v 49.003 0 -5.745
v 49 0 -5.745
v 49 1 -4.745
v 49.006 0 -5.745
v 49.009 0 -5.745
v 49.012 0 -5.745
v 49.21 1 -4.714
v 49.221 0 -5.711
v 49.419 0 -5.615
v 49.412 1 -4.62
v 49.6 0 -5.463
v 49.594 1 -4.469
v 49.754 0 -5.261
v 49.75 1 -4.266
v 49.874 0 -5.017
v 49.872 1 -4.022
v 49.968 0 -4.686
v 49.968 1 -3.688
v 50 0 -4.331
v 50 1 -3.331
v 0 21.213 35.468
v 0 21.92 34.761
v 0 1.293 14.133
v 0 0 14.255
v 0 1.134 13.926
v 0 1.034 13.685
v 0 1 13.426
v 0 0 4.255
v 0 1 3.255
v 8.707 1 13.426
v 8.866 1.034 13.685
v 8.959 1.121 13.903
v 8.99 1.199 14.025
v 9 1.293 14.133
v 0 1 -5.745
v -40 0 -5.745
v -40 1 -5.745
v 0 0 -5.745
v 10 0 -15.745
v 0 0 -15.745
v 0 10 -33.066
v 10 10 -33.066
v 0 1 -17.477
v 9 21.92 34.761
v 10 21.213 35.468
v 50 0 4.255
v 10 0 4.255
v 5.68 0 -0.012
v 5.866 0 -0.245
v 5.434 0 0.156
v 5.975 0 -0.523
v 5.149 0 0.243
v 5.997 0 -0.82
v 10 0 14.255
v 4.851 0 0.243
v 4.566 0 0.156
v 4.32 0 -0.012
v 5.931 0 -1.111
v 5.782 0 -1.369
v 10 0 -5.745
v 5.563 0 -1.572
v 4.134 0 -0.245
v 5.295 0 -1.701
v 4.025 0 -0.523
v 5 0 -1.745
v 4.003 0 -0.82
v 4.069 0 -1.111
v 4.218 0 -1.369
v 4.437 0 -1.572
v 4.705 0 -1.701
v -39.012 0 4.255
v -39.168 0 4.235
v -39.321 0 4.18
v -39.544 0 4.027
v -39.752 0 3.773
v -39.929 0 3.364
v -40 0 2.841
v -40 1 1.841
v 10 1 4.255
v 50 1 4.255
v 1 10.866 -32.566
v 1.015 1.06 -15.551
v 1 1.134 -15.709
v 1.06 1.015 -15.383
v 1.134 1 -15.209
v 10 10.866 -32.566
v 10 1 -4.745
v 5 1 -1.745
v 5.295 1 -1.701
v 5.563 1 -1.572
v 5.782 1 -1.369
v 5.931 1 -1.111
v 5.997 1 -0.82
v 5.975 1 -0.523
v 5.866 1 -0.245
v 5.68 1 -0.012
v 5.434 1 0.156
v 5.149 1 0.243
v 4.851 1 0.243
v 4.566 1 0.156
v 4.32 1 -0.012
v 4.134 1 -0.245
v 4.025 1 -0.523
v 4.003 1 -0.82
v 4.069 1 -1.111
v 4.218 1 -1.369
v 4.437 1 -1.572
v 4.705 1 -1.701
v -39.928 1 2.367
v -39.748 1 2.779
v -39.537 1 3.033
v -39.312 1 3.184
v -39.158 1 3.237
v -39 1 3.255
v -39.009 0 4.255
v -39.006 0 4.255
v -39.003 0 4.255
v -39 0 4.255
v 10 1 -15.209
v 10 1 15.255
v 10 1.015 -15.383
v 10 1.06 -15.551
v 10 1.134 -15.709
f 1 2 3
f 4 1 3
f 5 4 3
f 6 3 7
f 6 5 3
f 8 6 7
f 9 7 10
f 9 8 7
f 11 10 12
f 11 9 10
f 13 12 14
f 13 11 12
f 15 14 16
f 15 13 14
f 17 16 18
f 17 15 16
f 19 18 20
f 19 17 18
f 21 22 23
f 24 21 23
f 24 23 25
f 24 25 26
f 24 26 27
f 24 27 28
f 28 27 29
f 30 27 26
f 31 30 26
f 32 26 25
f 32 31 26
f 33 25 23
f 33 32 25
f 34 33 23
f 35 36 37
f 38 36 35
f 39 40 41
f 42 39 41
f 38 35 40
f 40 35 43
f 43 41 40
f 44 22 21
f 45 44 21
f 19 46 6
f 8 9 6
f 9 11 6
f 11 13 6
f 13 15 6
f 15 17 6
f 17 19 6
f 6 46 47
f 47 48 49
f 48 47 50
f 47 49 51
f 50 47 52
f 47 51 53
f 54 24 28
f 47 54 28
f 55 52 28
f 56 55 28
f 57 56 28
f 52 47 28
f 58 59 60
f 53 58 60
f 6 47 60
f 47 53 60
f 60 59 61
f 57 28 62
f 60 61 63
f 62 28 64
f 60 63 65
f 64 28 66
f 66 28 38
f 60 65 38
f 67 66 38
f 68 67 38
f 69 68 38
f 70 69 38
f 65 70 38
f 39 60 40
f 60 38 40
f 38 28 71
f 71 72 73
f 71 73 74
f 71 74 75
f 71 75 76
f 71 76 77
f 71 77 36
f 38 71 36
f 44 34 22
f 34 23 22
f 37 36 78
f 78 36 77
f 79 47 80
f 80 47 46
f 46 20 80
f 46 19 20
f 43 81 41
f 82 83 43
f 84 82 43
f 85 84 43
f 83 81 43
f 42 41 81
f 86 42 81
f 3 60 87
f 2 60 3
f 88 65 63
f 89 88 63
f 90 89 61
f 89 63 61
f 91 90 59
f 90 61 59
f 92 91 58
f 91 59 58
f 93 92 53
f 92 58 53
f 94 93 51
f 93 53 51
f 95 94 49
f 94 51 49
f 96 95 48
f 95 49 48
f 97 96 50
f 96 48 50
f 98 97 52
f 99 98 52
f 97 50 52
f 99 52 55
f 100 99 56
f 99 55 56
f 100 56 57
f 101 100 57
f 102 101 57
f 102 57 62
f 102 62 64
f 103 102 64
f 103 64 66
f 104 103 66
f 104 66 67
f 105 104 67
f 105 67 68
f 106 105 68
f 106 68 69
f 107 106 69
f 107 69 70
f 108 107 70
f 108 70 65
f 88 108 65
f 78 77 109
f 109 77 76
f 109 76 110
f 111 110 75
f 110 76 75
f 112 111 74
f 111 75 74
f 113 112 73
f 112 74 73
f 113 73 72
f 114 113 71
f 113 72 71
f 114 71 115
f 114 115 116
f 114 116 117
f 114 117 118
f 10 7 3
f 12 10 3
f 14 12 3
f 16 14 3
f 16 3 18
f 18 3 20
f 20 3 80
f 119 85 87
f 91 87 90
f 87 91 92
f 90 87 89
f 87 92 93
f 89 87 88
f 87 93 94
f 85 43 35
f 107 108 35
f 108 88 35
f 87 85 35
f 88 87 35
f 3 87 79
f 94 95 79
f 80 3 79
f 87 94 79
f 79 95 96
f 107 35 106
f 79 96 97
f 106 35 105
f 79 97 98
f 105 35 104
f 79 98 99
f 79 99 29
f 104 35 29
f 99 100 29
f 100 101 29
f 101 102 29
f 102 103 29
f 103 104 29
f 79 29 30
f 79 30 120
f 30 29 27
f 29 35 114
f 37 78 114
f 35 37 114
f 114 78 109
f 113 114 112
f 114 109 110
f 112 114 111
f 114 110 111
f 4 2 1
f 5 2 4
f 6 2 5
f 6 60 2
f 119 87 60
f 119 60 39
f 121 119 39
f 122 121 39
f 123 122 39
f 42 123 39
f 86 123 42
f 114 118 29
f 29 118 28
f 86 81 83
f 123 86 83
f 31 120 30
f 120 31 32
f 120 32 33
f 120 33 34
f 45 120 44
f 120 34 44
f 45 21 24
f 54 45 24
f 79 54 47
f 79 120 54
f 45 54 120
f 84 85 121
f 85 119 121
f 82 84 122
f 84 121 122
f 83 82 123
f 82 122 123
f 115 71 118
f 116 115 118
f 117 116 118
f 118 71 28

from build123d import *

# Parameters (mm, degrees)
TOP_BLADE_FIRST_EXTRUDE_DEPTH  = 10
SKETCH3_W                      = 40
SKETCH3_H                      = 10
TOP_BLADE_SECOND_EXTRUDE_DEPTH = 1
TOP_BLADE_CUT_1_SIZE           = 1
TOP_BLADE_ROUNDING_1_R         = 1
SKETCH5_R                      = 1
TOP_BLADE_CUT_2_DEPTH          = 19
TOP_BLADE_ROUNDING_2_R         = 1


with BuildPart() as part:
    # Sketch1 → Top Blade First Extrude (new body)
    with BuildSketch(Plane(origin=(0, 0, 0), x_dir=(0, 0, -1), z_dir=(1, 0, 0))):
        Polygon((-14.254658385, 0), (15.745341615, 0), (33.065849691, 10), (32.565849691, 10.866025404), (15.477392422, 1), (-13.840444823, 1), (-34.76075504, 21.920310217), (-35.467861821, 21.213203436), align=None)
    extrude(amount=TOP_BLADE_FIRST_EXTRUDE_DEPTH)

    # Sketch3 → Top Blade Second Extrude (add)
    with BuildSketch(Plane.XZ):
        with Locations((-20, -0.745341615)):
            Rectangle(SKETCH3_W, SKETCH3_H)
        with Locations((30, -0.745341615)):
            Rectangle(SKETCH3_W, SKETCH3_H)
    extrude(amount=-TOP_BLADE_SECOND_EXTRUDE_DEPTH)

    # Top Blade Cut 1
    top_blade_cut_1_edges = [part.edges().sort_by_distance(p)[0] for p in [
        (-20, 1, 4.254658385),
        (0, 5.933012702, -24.021621057),
        (30, 1, -5.745341615),
        (10, 11.460155108, 24.300599931),
    ]]
    chamfer(top_blade_cut_1_edges, length=TOP_BLADE_CUT_1_SIZE - 0.0001)  # a hair under: the kernel refuses the full size

    # Top Blade Rounding 1
    top_blade_rounding_1_edges = [part.edges().sort_by_distance(p)[0] for p in [
        (-40, 0.50005, 3.754708385),
        (50, 0.50005, -5.245391615),
    ]]
    fillet(top_blade_rounding_1_edges, radius=TOP_BLADE_ROUNDING_1_R)

    # Sketch5 → Top Blade Cut 2 (cut)
    with BuildSketch(Plane.XZ):
        with Locations(Location((5, -0.745341615, 0), (0, 0, 270))):
            Circle(SKETCH5_R)
    extrude(amount=-TOP_BLADE_CUT_2_DEPTH, mode=Mode.SUBTRACT)

    # Top Blade Rounding 2
    top_blade_rounding_2_edges = [part.edges().sort_by_distance(p)[0] for p in [
        (4.50005, 1, 13.840444823),
        (5.49995, 1, -15.477392422),
    ]]
    fillet(top_blade_rounding_2_edges, radius=TOP_BLADE_ROUNDING_2_R)


solid = part.part
